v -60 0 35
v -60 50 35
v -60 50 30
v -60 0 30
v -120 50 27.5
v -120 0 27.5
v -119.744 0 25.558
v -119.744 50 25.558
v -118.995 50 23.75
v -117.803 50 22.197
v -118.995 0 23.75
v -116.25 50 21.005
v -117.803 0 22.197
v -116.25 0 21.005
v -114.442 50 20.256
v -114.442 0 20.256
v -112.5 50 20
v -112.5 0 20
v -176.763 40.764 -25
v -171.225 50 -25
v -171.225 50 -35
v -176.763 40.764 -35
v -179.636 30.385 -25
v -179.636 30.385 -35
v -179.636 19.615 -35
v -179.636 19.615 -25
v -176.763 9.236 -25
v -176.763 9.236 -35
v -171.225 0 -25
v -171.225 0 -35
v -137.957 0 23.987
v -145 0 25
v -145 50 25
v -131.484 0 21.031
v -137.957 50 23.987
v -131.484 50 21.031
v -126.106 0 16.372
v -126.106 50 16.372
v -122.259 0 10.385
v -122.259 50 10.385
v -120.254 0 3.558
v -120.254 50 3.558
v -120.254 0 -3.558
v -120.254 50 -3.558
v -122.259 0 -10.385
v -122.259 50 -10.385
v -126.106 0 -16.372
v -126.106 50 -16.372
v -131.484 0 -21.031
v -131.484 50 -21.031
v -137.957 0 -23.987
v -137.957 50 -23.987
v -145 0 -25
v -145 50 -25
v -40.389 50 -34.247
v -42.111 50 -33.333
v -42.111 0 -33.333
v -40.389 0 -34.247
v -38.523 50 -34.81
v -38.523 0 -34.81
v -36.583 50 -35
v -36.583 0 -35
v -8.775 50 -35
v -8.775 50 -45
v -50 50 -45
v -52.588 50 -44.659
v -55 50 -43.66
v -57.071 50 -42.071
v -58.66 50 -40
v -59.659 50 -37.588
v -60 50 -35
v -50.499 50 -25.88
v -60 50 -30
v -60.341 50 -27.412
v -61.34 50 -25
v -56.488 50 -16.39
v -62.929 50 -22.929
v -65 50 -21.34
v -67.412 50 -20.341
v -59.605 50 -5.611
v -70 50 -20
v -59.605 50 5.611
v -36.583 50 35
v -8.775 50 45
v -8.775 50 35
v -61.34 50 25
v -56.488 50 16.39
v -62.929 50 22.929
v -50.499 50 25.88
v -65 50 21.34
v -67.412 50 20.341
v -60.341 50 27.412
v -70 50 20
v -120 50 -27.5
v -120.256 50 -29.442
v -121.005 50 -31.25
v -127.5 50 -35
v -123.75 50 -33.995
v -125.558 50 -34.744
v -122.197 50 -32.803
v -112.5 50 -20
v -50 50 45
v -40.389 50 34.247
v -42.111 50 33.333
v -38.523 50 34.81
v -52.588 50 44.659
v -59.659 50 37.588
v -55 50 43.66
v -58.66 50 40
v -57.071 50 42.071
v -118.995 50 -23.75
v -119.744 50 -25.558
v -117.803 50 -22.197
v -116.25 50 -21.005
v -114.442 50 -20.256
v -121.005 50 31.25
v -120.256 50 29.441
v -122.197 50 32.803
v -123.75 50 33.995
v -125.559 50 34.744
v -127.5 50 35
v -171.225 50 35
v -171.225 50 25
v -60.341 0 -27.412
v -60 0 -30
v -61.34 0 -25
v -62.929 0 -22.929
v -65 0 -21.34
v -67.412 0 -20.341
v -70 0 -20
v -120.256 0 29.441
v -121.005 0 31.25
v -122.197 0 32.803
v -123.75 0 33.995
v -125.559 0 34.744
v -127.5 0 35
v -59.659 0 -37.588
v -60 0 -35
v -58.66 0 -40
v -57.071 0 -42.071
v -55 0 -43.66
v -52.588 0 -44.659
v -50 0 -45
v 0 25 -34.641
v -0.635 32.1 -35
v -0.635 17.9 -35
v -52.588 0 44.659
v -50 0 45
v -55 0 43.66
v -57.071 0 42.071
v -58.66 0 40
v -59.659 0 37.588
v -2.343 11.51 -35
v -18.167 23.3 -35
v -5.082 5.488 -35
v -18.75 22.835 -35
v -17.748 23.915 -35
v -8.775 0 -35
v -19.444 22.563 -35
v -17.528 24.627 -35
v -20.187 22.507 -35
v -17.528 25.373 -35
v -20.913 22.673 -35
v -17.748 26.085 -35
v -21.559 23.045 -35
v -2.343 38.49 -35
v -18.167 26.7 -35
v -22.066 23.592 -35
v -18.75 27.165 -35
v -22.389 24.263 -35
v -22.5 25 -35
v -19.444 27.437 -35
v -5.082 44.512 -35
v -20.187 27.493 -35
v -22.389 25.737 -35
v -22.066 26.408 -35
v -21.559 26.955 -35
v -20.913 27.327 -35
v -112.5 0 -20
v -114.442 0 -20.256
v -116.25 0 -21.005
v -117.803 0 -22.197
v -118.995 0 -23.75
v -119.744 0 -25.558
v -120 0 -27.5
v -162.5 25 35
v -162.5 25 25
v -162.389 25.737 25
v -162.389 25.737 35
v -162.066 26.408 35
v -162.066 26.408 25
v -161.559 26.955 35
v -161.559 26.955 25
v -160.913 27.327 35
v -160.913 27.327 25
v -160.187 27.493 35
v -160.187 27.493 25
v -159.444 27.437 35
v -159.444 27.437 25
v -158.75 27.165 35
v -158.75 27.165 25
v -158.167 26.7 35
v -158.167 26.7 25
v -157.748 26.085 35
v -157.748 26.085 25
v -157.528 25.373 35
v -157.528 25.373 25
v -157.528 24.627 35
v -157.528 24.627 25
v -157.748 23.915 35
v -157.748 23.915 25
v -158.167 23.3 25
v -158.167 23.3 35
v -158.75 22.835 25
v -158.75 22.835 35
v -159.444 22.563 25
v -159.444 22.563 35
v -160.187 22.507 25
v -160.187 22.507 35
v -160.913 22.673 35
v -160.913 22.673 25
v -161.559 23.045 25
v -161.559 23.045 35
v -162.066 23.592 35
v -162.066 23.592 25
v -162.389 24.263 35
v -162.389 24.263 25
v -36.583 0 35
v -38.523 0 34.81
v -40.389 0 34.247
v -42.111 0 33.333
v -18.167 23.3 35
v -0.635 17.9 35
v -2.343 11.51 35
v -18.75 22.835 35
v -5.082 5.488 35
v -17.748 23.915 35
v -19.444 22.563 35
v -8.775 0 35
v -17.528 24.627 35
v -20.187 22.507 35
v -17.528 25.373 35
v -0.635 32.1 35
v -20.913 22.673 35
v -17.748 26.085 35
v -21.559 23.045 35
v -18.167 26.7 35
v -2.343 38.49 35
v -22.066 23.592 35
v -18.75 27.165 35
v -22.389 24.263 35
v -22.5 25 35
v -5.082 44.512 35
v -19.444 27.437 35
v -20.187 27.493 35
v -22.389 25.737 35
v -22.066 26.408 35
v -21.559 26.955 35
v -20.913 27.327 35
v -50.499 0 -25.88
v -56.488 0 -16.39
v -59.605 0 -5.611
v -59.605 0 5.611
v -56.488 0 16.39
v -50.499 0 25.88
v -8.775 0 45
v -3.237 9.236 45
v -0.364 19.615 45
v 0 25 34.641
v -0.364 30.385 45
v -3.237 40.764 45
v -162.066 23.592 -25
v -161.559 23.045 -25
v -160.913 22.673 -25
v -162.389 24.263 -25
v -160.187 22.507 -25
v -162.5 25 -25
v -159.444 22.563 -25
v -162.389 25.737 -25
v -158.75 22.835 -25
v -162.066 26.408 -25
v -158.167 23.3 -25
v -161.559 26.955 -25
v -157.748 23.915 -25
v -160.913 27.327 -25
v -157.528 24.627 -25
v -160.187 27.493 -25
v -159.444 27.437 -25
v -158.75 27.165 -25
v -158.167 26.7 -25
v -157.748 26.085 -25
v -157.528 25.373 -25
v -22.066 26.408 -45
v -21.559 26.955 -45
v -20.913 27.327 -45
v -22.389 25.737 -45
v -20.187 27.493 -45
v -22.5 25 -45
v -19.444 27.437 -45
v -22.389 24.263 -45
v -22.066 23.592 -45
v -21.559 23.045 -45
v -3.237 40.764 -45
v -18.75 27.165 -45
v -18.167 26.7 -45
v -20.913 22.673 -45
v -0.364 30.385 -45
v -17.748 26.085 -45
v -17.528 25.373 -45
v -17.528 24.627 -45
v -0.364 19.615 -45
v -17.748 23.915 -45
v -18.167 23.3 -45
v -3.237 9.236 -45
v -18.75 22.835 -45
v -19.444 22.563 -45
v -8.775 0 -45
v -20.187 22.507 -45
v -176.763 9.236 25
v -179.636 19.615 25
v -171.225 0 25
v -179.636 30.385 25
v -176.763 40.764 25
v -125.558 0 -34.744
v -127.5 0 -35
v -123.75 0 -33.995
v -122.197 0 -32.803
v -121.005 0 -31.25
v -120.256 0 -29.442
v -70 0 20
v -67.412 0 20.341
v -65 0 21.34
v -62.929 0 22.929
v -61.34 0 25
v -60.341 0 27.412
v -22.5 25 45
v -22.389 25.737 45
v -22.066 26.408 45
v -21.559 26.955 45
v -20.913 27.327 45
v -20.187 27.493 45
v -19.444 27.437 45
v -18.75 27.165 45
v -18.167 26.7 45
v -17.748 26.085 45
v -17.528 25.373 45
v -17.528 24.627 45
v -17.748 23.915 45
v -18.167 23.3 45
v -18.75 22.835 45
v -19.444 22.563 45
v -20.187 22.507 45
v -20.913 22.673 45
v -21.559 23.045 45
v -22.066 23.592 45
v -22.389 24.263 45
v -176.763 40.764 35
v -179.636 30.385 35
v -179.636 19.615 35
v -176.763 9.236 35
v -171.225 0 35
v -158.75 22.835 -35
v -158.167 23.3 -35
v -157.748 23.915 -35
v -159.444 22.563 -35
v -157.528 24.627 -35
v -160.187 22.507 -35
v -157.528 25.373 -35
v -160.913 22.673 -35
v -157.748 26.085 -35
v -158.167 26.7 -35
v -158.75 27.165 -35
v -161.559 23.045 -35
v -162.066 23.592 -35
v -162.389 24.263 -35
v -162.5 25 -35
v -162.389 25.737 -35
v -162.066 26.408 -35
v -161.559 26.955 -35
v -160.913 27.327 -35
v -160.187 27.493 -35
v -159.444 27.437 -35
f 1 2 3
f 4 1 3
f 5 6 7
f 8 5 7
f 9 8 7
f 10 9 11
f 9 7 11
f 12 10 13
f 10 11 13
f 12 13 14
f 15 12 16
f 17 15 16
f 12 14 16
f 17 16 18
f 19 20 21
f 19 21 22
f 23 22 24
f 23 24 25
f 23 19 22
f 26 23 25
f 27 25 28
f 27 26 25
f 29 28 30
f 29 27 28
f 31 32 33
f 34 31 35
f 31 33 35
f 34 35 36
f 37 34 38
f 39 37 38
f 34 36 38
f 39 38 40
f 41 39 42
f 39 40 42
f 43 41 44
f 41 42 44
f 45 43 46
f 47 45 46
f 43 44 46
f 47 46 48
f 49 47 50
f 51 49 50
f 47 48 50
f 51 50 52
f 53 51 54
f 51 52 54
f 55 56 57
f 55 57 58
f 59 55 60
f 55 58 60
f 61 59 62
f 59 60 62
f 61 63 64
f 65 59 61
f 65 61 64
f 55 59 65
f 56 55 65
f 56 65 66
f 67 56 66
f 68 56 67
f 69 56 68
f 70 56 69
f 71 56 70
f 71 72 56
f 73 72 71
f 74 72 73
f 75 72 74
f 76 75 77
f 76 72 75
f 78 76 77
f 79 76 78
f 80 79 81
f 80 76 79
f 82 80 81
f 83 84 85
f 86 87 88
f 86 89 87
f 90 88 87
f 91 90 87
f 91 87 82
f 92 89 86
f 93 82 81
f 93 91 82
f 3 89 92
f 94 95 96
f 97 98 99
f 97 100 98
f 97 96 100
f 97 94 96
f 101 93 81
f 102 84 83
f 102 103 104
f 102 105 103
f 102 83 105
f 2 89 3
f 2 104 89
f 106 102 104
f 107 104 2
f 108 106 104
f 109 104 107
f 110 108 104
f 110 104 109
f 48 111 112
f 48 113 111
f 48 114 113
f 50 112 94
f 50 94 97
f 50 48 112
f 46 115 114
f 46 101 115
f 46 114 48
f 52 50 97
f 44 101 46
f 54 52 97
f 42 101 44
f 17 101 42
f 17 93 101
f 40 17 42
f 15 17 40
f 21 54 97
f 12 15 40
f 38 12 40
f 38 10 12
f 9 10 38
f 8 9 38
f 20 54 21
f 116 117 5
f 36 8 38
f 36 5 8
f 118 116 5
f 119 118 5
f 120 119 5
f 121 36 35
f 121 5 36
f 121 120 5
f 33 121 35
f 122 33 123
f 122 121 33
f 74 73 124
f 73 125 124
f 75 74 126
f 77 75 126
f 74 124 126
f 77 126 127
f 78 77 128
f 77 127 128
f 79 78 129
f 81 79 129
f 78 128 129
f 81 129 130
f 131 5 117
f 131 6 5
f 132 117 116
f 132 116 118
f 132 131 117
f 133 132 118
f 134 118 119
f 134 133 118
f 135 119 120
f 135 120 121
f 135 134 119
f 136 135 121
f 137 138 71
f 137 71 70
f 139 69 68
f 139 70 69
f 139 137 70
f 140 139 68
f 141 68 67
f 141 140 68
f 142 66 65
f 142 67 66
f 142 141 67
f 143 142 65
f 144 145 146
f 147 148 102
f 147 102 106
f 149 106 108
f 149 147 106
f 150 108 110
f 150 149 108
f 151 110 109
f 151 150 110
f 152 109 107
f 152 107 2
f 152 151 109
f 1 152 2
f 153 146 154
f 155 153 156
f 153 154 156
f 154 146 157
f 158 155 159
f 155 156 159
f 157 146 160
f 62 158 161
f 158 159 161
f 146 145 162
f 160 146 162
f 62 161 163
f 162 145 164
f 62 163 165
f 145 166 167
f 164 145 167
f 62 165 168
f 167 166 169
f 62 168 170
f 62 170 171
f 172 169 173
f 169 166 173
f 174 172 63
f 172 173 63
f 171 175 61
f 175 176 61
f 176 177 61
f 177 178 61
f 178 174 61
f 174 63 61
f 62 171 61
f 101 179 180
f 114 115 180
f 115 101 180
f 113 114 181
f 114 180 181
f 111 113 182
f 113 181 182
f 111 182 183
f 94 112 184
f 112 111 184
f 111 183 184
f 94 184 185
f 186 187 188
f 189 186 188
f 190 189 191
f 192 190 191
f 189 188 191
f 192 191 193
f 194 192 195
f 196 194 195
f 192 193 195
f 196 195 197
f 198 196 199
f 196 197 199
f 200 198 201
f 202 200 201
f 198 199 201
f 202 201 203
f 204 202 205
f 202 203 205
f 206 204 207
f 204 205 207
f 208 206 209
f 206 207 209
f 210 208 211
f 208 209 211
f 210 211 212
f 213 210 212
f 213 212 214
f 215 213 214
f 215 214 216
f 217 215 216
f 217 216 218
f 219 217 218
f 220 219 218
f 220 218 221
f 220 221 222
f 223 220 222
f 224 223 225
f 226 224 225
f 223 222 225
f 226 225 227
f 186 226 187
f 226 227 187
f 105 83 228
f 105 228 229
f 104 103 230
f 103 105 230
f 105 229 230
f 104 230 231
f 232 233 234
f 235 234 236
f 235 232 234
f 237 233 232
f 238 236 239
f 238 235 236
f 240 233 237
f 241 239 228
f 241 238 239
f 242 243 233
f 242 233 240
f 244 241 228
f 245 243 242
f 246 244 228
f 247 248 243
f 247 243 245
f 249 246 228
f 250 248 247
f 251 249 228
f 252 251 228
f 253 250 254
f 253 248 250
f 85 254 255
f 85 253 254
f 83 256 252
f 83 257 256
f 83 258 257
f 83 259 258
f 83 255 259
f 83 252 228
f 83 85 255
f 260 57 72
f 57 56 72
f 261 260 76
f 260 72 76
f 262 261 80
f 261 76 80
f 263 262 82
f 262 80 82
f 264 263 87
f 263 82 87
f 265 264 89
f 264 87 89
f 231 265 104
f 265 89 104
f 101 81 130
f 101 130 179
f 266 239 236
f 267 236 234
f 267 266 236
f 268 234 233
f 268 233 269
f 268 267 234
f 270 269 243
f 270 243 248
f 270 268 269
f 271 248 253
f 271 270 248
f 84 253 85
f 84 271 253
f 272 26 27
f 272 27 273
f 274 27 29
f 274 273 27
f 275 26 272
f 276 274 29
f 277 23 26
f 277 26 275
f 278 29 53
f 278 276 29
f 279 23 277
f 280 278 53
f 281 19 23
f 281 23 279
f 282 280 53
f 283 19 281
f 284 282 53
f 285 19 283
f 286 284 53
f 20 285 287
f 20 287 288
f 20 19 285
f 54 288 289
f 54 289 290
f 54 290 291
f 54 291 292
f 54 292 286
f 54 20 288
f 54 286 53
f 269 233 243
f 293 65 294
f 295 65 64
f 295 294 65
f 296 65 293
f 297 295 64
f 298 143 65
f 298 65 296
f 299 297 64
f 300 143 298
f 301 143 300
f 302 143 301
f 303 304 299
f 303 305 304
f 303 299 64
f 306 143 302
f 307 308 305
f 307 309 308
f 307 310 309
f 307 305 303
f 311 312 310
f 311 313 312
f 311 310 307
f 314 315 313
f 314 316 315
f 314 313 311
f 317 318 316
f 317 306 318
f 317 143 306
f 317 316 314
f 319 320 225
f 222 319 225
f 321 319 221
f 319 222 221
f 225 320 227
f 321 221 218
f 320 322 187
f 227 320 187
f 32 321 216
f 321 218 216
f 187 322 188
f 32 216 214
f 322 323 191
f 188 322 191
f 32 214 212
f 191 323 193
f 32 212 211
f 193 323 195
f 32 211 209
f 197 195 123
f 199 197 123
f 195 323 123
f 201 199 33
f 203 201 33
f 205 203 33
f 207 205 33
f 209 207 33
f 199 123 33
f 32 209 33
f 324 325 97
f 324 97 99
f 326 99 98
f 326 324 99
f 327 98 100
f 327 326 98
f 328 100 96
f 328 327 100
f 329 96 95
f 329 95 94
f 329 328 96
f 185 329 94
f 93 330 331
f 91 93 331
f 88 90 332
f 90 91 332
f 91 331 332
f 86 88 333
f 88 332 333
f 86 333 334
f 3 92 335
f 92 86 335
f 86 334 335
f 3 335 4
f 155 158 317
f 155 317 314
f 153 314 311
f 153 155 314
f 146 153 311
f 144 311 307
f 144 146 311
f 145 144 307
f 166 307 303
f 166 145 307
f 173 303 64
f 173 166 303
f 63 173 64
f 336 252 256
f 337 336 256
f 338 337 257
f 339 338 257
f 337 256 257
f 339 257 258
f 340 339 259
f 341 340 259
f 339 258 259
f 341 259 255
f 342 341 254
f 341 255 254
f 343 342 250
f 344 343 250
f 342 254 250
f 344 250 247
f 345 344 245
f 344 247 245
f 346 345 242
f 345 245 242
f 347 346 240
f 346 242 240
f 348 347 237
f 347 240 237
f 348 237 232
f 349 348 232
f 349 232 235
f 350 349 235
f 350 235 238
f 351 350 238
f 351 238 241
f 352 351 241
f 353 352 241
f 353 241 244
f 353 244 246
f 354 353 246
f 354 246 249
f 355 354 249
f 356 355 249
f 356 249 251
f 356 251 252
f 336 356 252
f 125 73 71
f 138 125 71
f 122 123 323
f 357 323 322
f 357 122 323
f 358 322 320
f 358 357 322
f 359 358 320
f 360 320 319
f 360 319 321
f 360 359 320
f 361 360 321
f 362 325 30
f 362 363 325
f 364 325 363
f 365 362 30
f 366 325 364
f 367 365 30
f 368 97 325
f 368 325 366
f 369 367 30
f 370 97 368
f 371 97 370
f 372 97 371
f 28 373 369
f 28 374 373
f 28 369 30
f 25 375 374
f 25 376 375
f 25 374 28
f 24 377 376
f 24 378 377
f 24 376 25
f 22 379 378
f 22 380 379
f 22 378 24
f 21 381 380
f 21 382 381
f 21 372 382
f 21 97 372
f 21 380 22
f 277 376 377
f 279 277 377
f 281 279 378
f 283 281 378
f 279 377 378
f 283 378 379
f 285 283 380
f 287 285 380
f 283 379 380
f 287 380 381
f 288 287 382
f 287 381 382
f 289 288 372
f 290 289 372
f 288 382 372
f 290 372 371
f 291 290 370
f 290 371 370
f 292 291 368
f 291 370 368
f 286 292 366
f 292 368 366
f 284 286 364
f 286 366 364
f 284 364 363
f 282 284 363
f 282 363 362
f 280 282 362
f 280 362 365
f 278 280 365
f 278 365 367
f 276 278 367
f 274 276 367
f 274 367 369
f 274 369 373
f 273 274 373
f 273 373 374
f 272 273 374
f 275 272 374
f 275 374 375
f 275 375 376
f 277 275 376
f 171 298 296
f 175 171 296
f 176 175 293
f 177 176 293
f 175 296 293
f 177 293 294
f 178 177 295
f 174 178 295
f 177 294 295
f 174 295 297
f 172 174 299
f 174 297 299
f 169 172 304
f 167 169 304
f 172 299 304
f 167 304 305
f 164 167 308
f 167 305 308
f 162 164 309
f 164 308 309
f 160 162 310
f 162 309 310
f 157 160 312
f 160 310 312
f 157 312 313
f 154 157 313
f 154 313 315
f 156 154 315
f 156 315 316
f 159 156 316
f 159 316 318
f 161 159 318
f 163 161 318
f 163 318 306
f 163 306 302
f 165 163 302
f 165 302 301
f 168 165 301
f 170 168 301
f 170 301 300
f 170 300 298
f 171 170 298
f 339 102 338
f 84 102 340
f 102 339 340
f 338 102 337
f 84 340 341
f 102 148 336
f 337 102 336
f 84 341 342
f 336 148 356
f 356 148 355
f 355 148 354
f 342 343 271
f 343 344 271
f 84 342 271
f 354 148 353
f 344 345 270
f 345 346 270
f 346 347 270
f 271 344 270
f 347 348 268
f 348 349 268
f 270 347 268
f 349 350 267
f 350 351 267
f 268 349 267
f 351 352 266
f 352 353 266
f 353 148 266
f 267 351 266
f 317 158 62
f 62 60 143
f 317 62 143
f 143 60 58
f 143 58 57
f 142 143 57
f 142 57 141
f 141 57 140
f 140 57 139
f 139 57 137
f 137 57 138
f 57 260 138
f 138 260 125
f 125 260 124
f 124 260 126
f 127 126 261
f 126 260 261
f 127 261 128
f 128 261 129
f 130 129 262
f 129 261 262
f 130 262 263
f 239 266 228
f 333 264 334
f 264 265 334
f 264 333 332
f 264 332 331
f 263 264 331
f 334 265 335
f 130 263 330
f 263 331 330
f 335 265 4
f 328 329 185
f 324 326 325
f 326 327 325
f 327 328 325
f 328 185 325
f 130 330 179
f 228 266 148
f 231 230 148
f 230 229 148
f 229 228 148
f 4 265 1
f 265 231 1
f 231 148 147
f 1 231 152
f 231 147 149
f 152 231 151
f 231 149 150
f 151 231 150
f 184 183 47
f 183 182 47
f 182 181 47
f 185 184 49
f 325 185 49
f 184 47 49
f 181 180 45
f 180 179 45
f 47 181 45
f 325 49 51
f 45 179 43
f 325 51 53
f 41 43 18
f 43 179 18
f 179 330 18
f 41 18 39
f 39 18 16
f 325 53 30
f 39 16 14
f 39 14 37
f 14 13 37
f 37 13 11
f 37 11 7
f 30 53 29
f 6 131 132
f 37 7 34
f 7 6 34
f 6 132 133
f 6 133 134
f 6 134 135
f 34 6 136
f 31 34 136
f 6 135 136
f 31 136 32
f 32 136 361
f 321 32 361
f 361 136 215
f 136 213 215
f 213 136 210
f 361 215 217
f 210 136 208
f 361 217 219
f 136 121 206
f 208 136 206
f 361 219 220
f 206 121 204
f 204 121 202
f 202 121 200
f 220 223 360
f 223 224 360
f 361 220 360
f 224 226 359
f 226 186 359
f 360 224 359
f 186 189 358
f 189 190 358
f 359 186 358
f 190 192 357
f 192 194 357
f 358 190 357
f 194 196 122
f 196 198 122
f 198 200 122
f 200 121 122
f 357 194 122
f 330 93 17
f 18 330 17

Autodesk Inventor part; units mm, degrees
ref_plane "YZ Plane" through (0, 0, 0) normal (1, 0, 0) x (0, 1, 0)
ref_plane "XZ Plane" through (0, 0, 0) normal (0, 1, 0) x (-1, 0, 0)
ref_plane "XY Plane" through (0, 0, 0) normal (0, 0, 1) x (1, 0, 0)
sketch "Sketch1" plane through (0, 0, 0) normal (0, 1, 0) x (-1, 0, 0)
  line L0 (100, -45) -> (0, -45)
  line L1 (0, -45) -> (0, 0)
  line L2 (100, 45) -> (0, 45)
  line L3 (0, 45) -> (0, 0)
  line L4 (100, -45) -> (180, -45)
  line L5 (100, 45) -> (180, 45)
  line L6 (180, -45) -> (180, 45)
  dimension "d0" = 100
extrude "Extrusion1" add sketch "Sketch1" along normal blind 50
sketch "Sketch2" plane through (0, 50, 0) normal (0, 1, 0) x (1, 0, 0)
  line L0 (-180, -45) -> (0, -45) projected
  line L1 (-60, -45) -> (-60, 45)
  line L2 (0, 45) -> (-180, 45) projected
  line L3 (-120, 45) -> (-120, -45)
  line L4 (-60, 0) -> (-60, 20)
  line L5 (-60, 20) -> (-60, 0)
  line L6 (-60, 0) -> (-60, -20)
  line L7 (-60, -20) -> (-120, -20)
  line L8 (-60, 20) -> (-120, 20)
  line L9 (-180, -45) -> (0, -45)
  line L10 (0, 45) -> (-180, 45)
  line L11 (-180, 45) -> (-180, -45) projected
  line L12 (-180, -45) -> (-180, 45)
  line L13 (-180, -25) -> (-180, -15)
  line L14 (-180, 25) -> (-180, 15)
  line L15 (0, -45) -> (0, 45) projected
  line L16 (0, 45) -> (0, 35)
  line L17 (0, 35) -> (-60, 35)
  line L18 (0, -45) -> (0, -35)
  line L19 (0, -35) -> (-60, -35)
  line L20 (0, 0) -> (-20, 0)
  arc A0 (-0.6351, -35) -> (0, -34.641) centre (-20, 0) ccw
  arc A1 (0, 34.641) -> (-0.6351, 35) centre (-20, 0) ccw
  arc A2 (-39.3649, 35) -> (-39.3649, -35) centre (-20, 0) ccw
  line L21 (-120, 35) -> (-180, 35)
  line L22 (-120, -35) -> (-180, -35)
  line L23 (-180, 35) -> (-180, 25)
  line L24 (-180, 25) -> (-145, 25)
  line L25 (-180, -35) -> (-180, -25)
  line L26 (-180, -25) -> (-145, -25)
  arc A3 (-145, -25) -> (-145, 25) centre (-145, 0) ccw
  dimension "d5" = 60
  dimension "d13" = 20
  dimension "d14" = 20
  dimension "d18" = 10
  dimension "d19" = 10
  dimension "d25" = 10
  dimension "d26" = 10
  dimension "d27" = 20
  dimension "d28" = 10
  dimension "d29" = 10
extrude "Extrusion2" cut sketch "Sketch2" against normal blind 50 contours L11 L22 L3 L0 | L3 L7 L1 L0 | L11 L24 A3 L26 | A2 L17 A1 L15 A0 L19 | L3 L2 L1 L8 | L21 L11 L2 L3
fillet "Fillet1" radius 10 1 edges at (-39.3649, 25, 35)
fillet "Fillet2" radius 10 1 edges at (-39.3649, 25, -35)
fillet "Fillet3" radius 10 1 edges at (-60, 25, 45)
fillet "Fillet4" radius 10 3 edges at (-60, 25, 20) (-60, 25, -20) (-60, 25, -45)
fillet "Fillet5" radius 7.5 1 edges at (-120, 25, 35)
fillet "Fillet6" radius 7.5 3 edges at (-120, 25, 20) (-120, 25, -20) (-120, 25, -35)
sketch "Sketch3" plane through (-180, 0, -35) normal (0, 0, -1) x (-1, 0, 0)
  line L0 (0, 0) -> (0, 50) projected
  arc A0 (-8.775, 0) -> (-8.775, 50) centre (-40, 25) ccw
  line L1 (0, 50) -> (-52.5, 50) projected
  line L2 (0, 50) -> (-8.775, 50)
  line L3 (-8.775, 0) -> (0, 0)
  line L4 (0, 0) -> (0, 50)
  line L5 (-180, 0) -> (-180, 50) projected
  arc A1 (-171.225, 50) -> (-171.225, 0) centre (-140, 25) ccw
  line L6 (-130, 0) -> (-180, 0) projected
  line L7 (-180, 0) -> (-171.225, 0)
  line L8 (-171.225, 50) -> (-180, 50)
  line L9 (-180, 50) -> (-180, 0)
  point P0 (-180, 25)
  point P1 (-171.225, 0)
  point P2 (-8.775, 50)
  point P3 (0, 25)
extrude "Extrusion3" cut sketch "Sketch3" along normal mid plane 200
sketch "Sketch4" plane through (-50, 0, -45) normal (0, 0, -1) x (-1, 0, 0)
  arc A0 (-41.225, 50) -> (-41.225, 0) centre (-10, 25) ccw projected
  circle A1 centre (-30, 25) radius 2.5
  arc A2 (121.225, 0) -> (121.225, 50) centre (90, 25) ccw projected
  circle A3 centre (110, 25) radius 2.5
  point P0 (-50, 0)
  dimension "d44" = 5
  dimension "d46" = 5
extrude "Extrusion4" cut sketch "Sketch4" against normal blind 200
sketch "Sketch5" plane through (0, 0, 0) normal (0, -1, 0) x (1, 0, 0)
  point P0 (0, 0)
sketch "Sketch6" plane through (-127.5, 0, 35) normal (0, 0, 1) x (1, 0, 0)
  point P0 (127.5, 0)
properties part number "PartArm"
